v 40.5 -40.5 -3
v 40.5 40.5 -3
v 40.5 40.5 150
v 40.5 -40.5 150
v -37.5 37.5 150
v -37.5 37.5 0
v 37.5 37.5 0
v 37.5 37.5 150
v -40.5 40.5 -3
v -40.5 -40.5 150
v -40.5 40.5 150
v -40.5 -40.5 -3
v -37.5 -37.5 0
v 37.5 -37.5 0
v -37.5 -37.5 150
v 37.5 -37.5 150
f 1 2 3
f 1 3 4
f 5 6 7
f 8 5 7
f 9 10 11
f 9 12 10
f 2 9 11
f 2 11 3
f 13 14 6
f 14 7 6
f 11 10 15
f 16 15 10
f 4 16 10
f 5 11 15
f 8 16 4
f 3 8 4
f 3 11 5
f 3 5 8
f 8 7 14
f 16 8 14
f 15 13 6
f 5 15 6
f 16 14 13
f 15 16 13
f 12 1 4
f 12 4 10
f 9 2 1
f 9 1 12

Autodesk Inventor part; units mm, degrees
ref_plane "YZ Plane" through (0, 0, 0) normal (1, 0, 0) x (0, 1, 0)
ref_plane "XZ Plane" through (0, 0, 0) normal (0, 1, 0) x (-1, 0, 0)
ref_plane "XY Plane" through (0, 0, 0) normal (0, 0, 1) x (1, 0, 0)
sketch "Sketch1" plane through (0, 0, 0) normal (0, 0, 1) x (1, 0, 0)
  line L0 (0, 56.7) -> (0, -56.7) construction
  line L1 (-56.7, 0) -> (56.7, 0) construction
  line L2 (-37.5, 37.5) -> (37.5, 37.5)
  line L3 (37.5, 37.5) -> (37.5, -37.5)
  line L4 (37.5, -37.5) -> (-37.5, -37.5)
  line L5 (-37.5, -37.5) -> (-37.5, 37.5)
  line L6 (-40.5, 40.5) -> (40.5, 40.5)
  line L7 (40.5, 40.5) -> (40.5, -40.5)
  line L8 (40.5, -40.5) -> (-40.5, -40.5)
  line L9 (-40.5, -40.5) -> (-40.5, 40.5)
  point P0 (0, 0)
  dimension "d0" = 75
  dimension "d1" = 75
  dimension "d2" = 3
  dimension "d3" = 3
  dimension "d4" = 3
  dimension "d5" = 3
extrude "Extrusion1" add sketch "Sketch1" along normal blind 150
sketch "Sketch2" plane through (0, 0, 0) normal (0, 0, -1) x (-1, 0, 0)
  line L0 (-40.5, -40.5) -> (40.5, -40.5) projected
  line L1 (40.5, -40.5) -> (40.5, 40.5) projected
  line L2 (40.5, 40.5) -> (-40.5, 40.5) projected
  line L3 (-40.5, 40.5) -> (-40.5, -40.5) projected
  point P0 (0, 0)
extrude "Extrusion2" add sketch "Sketch2" along normal blind 3
properties part number "Cuvette_75x75x150" material "Glass"
